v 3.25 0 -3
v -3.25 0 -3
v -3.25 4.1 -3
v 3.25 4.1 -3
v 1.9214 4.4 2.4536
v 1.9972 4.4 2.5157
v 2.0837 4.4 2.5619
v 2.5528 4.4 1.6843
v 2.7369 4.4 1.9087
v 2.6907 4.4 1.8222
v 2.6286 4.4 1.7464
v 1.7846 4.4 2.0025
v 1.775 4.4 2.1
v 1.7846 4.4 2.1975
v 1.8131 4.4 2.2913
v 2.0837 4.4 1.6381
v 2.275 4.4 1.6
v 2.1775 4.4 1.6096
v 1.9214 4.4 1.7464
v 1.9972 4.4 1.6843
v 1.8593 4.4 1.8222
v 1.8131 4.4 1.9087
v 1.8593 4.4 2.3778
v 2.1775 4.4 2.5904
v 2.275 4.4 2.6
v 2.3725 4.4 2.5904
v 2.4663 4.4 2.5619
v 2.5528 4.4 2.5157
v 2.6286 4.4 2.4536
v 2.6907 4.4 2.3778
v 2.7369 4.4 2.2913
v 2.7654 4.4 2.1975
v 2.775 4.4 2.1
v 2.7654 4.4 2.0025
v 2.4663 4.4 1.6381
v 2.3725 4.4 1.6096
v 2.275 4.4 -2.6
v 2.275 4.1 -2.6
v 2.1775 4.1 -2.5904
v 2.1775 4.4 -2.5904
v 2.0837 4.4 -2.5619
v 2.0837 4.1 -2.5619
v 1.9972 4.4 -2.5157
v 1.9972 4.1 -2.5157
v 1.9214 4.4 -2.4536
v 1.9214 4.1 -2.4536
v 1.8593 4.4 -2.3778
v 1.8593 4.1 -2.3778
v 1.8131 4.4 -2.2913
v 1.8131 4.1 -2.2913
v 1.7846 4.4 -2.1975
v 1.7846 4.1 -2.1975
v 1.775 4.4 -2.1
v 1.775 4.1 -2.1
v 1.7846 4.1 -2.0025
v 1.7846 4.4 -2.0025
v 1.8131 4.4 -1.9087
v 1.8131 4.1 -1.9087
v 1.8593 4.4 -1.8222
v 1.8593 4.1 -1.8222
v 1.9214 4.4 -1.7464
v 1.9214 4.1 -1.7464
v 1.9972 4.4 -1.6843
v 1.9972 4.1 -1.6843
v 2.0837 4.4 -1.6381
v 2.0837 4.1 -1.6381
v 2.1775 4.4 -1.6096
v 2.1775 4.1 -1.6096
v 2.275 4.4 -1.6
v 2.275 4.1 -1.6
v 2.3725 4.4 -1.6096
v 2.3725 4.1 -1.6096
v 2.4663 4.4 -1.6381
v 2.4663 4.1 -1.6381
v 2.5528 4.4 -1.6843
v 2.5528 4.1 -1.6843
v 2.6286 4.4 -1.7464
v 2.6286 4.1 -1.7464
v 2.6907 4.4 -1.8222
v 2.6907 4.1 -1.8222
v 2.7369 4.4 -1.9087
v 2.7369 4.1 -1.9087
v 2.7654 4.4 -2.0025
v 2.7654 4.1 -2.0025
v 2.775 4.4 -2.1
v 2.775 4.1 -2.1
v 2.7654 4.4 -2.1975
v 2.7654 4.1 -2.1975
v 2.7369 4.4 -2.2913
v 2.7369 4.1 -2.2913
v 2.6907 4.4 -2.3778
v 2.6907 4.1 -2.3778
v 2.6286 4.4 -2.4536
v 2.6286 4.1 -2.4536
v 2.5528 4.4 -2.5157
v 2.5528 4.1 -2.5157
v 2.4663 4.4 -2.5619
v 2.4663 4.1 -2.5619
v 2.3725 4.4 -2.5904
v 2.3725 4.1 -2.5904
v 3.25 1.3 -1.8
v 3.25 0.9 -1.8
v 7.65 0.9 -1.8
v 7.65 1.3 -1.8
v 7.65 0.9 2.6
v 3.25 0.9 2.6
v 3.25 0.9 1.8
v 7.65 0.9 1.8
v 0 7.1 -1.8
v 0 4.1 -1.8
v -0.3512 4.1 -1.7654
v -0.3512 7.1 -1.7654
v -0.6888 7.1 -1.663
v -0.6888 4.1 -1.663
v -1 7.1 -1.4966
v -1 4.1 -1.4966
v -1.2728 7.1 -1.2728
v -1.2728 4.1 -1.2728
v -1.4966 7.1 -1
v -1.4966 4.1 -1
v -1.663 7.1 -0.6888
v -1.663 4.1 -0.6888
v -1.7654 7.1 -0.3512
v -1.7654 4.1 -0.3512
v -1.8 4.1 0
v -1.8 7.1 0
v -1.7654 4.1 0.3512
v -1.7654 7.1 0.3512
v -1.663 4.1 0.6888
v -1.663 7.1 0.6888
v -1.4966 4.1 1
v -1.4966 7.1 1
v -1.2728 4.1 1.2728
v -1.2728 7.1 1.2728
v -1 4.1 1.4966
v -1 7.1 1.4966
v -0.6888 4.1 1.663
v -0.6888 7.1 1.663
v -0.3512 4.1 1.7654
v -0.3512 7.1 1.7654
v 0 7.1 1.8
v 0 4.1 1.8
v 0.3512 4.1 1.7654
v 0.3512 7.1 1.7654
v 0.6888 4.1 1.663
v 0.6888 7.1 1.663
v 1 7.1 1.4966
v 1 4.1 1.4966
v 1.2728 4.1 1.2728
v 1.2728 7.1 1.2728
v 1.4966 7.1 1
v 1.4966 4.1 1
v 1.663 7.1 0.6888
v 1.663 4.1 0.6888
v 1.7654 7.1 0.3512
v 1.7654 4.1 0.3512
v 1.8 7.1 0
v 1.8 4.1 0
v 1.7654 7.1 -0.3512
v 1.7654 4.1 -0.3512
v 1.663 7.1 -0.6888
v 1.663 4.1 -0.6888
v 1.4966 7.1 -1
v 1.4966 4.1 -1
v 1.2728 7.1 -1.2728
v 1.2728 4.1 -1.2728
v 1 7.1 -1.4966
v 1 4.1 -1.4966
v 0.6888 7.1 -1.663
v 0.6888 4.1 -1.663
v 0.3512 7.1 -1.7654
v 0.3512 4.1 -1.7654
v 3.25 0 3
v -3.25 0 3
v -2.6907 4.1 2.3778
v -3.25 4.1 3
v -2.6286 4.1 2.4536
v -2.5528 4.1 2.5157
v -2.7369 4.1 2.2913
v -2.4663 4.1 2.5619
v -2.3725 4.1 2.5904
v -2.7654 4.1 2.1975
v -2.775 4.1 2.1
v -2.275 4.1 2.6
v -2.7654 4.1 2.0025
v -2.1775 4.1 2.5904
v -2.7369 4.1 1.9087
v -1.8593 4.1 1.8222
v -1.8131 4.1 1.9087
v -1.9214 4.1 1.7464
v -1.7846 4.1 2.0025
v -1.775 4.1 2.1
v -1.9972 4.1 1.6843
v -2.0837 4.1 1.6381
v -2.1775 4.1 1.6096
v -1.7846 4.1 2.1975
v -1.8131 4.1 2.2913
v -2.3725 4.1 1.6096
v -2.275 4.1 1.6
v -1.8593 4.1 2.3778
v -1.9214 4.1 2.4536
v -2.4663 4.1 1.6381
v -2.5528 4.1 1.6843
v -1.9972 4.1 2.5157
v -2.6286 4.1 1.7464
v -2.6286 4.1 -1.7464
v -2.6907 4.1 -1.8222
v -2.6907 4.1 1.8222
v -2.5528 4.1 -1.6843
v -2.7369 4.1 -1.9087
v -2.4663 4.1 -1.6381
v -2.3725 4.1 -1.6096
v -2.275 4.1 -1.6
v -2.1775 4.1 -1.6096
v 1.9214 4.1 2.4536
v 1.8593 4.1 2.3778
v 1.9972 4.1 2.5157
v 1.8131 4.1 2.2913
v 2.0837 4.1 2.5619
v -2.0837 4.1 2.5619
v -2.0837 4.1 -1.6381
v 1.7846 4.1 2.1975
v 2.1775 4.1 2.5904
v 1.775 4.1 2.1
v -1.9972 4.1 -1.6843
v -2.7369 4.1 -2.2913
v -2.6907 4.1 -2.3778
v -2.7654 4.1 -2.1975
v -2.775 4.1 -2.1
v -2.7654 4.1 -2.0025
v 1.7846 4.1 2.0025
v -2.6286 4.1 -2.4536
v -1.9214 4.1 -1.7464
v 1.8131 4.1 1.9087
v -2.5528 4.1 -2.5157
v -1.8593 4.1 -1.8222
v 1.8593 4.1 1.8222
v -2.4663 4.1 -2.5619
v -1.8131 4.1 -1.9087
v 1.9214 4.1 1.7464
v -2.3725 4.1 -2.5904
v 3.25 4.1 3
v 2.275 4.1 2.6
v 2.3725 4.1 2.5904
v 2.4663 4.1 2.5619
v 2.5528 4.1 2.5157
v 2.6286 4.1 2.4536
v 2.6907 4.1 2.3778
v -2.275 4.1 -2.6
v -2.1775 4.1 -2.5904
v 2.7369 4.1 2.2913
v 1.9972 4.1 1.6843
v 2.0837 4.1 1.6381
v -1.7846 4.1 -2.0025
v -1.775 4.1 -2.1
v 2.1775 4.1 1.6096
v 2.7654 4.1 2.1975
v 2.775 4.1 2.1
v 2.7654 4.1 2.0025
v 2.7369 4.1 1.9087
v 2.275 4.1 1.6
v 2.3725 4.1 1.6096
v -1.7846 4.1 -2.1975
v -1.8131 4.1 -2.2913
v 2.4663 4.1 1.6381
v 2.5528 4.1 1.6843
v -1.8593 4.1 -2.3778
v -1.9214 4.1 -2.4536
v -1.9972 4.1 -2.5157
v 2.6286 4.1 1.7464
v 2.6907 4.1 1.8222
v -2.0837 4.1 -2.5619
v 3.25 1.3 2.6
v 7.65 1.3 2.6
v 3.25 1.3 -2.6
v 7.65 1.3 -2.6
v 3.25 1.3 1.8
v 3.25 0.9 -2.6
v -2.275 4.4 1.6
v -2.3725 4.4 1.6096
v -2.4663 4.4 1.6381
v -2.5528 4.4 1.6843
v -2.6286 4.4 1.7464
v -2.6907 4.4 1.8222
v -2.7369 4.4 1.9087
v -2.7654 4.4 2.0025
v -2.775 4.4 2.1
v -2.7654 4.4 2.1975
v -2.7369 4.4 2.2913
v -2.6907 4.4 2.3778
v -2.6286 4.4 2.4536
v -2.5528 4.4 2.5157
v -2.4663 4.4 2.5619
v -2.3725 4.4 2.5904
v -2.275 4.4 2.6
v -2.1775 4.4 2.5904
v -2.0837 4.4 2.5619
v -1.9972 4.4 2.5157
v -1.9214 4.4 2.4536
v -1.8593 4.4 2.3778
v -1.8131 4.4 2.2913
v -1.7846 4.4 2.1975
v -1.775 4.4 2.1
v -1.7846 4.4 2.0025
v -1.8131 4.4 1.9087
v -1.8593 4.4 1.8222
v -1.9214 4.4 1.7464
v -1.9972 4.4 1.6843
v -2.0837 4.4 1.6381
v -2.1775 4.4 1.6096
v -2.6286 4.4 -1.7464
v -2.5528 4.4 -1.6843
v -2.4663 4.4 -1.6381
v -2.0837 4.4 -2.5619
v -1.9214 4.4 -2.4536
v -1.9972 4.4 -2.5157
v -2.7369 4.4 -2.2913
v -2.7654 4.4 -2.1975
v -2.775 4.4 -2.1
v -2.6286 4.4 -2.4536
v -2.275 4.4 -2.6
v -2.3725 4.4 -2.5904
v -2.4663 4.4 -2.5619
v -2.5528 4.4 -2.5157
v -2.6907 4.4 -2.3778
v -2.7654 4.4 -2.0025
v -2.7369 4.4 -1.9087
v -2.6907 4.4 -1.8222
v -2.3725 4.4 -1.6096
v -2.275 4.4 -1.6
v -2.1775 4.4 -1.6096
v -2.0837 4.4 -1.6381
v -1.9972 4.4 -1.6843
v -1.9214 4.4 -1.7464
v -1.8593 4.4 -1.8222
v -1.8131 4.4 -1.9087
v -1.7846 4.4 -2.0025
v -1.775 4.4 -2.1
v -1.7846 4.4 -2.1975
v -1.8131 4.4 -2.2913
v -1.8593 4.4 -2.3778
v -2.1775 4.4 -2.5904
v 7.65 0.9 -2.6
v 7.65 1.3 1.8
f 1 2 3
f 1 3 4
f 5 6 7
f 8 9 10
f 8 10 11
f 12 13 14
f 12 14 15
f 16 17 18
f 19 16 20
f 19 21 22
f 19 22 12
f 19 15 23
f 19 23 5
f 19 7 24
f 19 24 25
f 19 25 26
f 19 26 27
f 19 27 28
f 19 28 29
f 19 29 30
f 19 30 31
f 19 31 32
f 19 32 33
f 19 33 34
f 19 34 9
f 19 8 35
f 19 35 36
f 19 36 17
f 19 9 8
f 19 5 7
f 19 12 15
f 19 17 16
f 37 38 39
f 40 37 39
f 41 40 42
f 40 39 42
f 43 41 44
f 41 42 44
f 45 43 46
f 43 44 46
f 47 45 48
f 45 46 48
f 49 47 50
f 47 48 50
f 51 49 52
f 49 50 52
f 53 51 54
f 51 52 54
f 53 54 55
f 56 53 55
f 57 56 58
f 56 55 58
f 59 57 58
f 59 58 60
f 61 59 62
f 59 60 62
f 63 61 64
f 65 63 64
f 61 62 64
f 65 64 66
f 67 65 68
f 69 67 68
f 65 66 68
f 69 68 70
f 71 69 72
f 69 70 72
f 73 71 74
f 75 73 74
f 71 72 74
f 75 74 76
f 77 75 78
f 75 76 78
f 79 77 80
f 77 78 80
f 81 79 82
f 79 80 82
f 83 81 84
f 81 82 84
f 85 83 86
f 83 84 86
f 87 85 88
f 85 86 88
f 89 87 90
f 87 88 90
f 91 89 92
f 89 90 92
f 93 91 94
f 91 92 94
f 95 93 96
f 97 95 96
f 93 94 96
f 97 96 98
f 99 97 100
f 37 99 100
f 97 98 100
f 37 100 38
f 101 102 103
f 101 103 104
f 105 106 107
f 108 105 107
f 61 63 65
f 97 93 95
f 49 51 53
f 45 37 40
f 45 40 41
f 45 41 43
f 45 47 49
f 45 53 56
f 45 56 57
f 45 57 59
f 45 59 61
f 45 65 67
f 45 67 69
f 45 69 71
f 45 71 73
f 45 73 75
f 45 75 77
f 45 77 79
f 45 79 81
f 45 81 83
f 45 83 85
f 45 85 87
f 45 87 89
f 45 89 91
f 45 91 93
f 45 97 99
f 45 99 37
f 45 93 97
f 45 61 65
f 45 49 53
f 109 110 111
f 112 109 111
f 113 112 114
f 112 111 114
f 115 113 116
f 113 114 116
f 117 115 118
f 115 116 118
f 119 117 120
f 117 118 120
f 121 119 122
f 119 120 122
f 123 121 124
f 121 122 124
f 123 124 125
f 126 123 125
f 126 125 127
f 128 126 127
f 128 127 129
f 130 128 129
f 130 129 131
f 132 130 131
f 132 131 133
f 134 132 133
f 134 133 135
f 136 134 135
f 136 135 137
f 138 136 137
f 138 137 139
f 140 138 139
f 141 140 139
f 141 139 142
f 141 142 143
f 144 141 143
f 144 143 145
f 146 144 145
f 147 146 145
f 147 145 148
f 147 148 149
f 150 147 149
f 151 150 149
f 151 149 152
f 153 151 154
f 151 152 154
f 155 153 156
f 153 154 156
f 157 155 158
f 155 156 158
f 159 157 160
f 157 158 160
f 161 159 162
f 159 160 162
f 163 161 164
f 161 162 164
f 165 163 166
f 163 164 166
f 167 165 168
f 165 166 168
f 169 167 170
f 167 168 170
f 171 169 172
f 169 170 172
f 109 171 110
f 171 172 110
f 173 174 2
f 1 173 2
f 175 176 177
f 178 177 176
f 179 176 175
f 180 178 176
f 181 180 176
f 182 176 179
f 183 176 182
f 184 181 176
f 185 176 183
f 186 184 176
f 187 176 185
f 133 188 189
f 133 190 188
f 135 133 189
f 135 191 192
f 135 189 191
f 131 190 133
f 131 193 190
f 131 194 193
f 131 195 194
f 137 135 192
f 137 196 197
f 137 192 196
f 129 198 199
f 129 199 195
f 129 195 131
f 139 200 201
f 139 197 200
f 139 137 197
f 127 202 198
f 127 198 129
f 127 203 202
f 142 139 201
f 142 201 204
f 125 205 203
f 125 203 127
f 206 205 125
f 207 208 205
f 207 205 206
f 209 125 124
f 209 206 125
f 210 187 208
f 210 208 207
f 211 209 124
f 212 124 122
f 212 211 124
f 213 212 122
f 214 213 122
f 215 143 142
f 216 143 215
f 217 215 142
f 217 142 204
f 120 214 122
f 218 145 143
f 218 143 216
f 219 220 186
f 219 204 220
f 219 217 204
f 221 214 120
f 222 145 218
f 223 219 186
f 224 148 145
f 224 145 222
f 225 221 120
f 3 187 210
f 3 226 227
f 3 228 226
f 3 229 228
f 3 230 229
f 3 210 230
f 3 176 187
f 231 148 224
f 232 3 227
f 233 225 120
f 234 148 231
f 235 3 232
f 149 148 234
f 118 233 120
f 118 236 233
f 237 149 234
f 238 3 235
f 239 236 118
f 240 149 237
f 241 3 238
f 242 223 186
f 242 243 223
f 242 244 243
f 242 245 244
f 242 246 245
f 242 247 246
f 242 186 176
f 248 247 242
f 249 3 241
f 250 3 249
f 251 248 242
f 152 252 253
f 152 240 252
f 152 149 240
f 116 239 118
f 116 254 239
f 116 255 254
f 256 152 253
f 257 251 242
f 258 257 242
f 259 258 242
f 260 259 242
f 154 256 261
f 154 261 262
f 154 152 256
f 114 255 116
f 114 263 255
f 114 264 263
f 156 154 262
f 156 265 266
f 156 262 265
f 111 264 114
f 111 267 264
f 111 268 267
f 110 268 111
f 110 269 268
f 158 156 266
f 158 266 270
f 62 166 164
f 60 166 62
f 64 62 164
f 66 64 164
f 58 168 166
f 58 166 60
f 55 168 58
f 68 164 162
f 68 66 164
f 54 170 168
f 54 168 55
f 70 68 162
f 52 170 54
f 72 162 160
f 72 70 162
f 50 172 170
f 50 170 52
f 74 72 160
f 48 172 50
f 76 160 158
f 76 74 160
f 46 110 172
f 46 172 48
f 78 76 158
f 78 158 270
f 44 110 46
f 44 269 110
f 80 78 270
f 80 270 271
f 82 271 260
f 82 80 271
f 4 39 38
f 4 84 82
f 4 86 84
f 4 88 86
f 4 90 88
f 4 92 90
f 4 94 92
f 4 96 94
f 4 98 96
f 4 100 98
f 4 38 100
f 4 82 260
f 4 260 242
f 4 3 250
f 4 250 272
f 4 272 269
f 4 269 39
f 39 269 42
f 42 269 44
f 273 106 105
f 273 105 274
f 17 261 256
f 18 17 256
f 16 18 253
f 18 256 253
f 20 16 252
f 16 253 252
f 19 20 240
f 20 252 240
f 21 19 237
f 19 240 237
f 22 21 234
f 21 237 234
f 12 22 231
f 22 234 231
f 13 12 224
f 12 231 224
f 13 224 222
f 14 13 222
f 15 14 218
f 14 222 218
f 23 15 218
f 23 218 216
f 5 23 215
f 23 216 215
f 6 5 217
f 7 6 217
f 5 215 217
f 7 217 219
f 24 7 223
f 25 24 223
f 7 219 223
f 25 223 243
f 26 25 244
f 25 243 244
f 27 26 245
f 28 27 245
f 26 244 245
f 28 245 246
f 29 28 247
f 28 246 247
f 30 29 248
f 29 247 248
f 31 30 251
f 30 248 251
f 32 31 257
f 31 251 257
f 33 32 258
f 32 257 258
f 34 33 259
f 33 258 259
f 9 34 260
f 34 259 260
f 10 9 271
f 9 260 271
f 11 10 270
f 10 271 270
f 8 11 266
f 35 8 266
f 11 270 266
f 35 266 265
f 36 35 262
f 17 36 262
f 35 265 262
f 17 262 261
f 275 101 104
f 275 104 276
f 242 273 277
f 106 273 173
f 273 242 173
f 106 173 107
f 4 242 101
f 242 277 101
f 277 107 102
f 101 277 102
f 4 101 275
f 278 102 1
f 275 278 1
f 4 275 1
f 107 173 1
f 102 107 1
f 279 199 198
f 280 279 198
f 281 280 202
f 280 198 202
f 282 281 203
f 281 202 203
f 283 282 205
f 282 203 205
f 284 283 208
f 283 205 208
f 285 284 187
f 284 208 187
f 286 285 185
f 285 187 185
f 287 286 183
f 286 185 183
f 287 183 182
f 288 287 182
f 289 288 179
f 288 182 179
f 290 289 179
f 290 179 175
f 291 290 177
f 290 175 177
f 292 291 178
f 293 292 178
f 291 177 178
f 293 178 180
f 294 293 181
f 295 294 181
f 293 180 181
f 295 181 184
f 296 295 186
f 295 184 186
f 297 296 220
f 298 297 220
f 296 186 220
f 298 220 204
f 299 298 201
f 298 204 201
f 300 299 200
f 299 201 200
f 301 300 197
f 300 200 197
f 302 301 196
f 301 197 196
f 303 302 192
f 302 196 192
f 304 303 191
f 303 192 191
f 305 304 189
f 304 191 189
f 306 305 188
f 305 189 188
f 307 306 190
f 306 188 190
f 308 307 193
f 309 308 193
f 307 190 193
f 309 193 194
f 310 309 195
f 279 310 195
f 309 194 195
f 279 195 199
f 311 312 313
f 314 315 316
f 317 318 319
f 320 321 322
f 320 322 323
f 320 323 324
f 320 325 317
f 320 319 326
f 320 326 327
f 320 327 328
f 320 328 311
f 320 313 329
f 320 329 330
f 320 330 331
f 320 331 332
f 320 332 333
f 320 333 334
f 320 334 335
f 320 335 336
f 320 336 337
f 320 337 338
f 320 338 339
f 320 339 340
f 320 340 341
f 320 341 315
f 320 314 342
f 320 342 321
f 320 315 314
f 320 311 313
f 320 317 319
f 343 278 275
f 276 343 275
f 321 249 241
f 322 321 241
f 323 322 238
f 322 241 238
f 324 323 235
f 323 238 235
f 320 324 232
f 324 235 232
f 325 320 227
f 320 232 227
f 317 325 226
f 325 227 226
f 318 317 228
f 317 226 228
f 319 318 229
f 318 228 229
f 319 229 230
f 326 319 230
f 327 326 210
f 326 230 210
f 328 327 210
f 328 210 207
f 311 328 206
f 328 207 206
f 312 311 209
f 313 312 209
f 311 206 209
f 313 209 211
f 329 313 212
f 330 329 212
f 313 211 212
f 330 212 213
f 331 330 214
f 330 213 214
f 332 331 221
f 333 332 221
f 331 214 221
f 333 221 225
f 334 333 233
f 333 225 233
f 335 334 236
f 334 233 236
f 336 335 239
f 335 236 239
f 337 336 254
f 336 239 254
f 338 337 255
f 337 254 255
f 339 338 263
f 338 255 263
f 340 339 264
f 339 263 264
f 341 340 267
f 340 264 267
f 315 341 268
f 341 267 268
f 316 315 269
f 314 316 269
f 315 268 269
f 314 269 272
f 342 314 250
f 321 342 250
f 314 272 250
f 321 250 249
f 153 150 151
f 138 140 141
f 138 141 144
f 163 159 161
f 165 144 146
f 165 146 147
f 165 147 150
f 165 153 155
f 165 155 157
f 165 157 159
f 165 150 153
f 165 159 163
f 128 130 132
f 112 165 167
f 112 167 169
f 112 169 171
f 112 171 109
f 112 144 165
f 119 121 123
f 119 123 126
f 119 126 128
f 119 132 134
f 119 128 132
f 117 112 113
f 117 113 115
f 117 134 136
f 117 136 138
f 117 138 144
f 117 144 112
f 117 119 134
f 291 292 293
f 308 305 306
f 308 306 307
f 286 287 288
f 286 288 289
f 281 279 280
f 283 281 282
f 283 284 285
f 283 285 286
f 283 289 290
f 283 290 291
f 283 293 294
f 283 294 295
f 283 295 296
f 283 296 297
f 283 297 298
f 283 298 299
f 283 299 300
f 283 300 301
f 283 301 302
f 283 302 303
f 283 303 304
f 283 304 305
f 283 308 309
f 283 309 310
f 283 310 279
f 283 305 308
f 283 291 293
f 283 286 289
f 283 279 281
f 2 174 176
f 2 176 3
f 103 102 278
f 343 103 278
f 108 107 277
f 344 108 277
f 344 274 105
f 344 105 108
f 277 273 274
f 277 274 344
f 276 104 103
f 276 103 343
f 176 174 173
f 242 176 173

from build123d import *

# Parameters (mm, degrees)
SKETCH_1_W      = 6.5
SKETCH_1_H      = 6
EXTRUDE_1_DEPTH = 4.1
SKETCH_1_3_R    = 1.8
EXTRUDE_2_DEPTH = 7.1
EXTRUDE_START   = 4.1
SKETCH_1_4_R    = 0.5
EXTRUDE_3_DEPTH = 0.3
SKETCH_2_W      = 0.8
SKETCH_2_H      = 0.4
EXTRUDE_4_DEPTH = 4.4


with BuildPart() as part:
    # 草图1 → 凸台-拉伸1 (new body)
    with BuildSketch(Plane(origin=(0, 0, 0), x_dir=(1, 0, 0), z_dir=(0, 1, 0))):
        Rectangle(SKETCH_1_W, SKETCH_1_H)
    extrude(amount=EXTRUDE_1_DEPTH)

    # 草图1<3> → 凸台-拉伸2 (add)
    with BuildSketch(Plane(origin=(0, 0, 0), x_dir=(1, 0, 0), z_dir=(0, 1, 0))):
        with Locations(Location((0, 0, 0), (0, 0, 90))):
            Circle(SKETCH_1_3_R)
    extrude(amount=EXTRUDE_2_DEPTH)

    # 草图1<4> → 凸台-拉伸3 (add)
    with BuildSketch(Plane(origin=(0, 0, 0), x_dir=(1, 0, 0), z_dir=(0, 1, 0)).offset(EXTRUDE_START)):
        with Locations(Location((-2.275, 2.1, 0), (0, 0, 90))):
            Circle(SKETCH_1_4_R)
        with Locations(Location((-2.275, -2.1, 0), (0, 0, 90))):
            Circle(SKETCH_1_4_R)
        with Locations(Location((2.275, -2.1, 0), (0, 0, 90))):
            Circle(SKETCH_1_4_R)
        with Locations(Location((2.275, 2.1, 0), (0, 0, 90))):
            Circle(SKETCH_1_4_R)
    extrude(amount=EXTRUDE_3_DEPTH)

    # 草图2 → 凸台-拉伸4 (add)
    with BuildSketch(Plane(origin=(3.25, 0, 0), x_dir=(0, 0, -1), z_dir=(1, 0, 0))):
        with Locations((-2.2, 1.1)):
            Rectangle(SKETCH_2_W, SKETCH_2_H)
        with Locations((2.2, 1.1)):
            Rectangle(SKETCH_2_W, SKETCH_2_H)
    extrude(amount=EXTRUDE_4_DEPTH)


solid = part.part
